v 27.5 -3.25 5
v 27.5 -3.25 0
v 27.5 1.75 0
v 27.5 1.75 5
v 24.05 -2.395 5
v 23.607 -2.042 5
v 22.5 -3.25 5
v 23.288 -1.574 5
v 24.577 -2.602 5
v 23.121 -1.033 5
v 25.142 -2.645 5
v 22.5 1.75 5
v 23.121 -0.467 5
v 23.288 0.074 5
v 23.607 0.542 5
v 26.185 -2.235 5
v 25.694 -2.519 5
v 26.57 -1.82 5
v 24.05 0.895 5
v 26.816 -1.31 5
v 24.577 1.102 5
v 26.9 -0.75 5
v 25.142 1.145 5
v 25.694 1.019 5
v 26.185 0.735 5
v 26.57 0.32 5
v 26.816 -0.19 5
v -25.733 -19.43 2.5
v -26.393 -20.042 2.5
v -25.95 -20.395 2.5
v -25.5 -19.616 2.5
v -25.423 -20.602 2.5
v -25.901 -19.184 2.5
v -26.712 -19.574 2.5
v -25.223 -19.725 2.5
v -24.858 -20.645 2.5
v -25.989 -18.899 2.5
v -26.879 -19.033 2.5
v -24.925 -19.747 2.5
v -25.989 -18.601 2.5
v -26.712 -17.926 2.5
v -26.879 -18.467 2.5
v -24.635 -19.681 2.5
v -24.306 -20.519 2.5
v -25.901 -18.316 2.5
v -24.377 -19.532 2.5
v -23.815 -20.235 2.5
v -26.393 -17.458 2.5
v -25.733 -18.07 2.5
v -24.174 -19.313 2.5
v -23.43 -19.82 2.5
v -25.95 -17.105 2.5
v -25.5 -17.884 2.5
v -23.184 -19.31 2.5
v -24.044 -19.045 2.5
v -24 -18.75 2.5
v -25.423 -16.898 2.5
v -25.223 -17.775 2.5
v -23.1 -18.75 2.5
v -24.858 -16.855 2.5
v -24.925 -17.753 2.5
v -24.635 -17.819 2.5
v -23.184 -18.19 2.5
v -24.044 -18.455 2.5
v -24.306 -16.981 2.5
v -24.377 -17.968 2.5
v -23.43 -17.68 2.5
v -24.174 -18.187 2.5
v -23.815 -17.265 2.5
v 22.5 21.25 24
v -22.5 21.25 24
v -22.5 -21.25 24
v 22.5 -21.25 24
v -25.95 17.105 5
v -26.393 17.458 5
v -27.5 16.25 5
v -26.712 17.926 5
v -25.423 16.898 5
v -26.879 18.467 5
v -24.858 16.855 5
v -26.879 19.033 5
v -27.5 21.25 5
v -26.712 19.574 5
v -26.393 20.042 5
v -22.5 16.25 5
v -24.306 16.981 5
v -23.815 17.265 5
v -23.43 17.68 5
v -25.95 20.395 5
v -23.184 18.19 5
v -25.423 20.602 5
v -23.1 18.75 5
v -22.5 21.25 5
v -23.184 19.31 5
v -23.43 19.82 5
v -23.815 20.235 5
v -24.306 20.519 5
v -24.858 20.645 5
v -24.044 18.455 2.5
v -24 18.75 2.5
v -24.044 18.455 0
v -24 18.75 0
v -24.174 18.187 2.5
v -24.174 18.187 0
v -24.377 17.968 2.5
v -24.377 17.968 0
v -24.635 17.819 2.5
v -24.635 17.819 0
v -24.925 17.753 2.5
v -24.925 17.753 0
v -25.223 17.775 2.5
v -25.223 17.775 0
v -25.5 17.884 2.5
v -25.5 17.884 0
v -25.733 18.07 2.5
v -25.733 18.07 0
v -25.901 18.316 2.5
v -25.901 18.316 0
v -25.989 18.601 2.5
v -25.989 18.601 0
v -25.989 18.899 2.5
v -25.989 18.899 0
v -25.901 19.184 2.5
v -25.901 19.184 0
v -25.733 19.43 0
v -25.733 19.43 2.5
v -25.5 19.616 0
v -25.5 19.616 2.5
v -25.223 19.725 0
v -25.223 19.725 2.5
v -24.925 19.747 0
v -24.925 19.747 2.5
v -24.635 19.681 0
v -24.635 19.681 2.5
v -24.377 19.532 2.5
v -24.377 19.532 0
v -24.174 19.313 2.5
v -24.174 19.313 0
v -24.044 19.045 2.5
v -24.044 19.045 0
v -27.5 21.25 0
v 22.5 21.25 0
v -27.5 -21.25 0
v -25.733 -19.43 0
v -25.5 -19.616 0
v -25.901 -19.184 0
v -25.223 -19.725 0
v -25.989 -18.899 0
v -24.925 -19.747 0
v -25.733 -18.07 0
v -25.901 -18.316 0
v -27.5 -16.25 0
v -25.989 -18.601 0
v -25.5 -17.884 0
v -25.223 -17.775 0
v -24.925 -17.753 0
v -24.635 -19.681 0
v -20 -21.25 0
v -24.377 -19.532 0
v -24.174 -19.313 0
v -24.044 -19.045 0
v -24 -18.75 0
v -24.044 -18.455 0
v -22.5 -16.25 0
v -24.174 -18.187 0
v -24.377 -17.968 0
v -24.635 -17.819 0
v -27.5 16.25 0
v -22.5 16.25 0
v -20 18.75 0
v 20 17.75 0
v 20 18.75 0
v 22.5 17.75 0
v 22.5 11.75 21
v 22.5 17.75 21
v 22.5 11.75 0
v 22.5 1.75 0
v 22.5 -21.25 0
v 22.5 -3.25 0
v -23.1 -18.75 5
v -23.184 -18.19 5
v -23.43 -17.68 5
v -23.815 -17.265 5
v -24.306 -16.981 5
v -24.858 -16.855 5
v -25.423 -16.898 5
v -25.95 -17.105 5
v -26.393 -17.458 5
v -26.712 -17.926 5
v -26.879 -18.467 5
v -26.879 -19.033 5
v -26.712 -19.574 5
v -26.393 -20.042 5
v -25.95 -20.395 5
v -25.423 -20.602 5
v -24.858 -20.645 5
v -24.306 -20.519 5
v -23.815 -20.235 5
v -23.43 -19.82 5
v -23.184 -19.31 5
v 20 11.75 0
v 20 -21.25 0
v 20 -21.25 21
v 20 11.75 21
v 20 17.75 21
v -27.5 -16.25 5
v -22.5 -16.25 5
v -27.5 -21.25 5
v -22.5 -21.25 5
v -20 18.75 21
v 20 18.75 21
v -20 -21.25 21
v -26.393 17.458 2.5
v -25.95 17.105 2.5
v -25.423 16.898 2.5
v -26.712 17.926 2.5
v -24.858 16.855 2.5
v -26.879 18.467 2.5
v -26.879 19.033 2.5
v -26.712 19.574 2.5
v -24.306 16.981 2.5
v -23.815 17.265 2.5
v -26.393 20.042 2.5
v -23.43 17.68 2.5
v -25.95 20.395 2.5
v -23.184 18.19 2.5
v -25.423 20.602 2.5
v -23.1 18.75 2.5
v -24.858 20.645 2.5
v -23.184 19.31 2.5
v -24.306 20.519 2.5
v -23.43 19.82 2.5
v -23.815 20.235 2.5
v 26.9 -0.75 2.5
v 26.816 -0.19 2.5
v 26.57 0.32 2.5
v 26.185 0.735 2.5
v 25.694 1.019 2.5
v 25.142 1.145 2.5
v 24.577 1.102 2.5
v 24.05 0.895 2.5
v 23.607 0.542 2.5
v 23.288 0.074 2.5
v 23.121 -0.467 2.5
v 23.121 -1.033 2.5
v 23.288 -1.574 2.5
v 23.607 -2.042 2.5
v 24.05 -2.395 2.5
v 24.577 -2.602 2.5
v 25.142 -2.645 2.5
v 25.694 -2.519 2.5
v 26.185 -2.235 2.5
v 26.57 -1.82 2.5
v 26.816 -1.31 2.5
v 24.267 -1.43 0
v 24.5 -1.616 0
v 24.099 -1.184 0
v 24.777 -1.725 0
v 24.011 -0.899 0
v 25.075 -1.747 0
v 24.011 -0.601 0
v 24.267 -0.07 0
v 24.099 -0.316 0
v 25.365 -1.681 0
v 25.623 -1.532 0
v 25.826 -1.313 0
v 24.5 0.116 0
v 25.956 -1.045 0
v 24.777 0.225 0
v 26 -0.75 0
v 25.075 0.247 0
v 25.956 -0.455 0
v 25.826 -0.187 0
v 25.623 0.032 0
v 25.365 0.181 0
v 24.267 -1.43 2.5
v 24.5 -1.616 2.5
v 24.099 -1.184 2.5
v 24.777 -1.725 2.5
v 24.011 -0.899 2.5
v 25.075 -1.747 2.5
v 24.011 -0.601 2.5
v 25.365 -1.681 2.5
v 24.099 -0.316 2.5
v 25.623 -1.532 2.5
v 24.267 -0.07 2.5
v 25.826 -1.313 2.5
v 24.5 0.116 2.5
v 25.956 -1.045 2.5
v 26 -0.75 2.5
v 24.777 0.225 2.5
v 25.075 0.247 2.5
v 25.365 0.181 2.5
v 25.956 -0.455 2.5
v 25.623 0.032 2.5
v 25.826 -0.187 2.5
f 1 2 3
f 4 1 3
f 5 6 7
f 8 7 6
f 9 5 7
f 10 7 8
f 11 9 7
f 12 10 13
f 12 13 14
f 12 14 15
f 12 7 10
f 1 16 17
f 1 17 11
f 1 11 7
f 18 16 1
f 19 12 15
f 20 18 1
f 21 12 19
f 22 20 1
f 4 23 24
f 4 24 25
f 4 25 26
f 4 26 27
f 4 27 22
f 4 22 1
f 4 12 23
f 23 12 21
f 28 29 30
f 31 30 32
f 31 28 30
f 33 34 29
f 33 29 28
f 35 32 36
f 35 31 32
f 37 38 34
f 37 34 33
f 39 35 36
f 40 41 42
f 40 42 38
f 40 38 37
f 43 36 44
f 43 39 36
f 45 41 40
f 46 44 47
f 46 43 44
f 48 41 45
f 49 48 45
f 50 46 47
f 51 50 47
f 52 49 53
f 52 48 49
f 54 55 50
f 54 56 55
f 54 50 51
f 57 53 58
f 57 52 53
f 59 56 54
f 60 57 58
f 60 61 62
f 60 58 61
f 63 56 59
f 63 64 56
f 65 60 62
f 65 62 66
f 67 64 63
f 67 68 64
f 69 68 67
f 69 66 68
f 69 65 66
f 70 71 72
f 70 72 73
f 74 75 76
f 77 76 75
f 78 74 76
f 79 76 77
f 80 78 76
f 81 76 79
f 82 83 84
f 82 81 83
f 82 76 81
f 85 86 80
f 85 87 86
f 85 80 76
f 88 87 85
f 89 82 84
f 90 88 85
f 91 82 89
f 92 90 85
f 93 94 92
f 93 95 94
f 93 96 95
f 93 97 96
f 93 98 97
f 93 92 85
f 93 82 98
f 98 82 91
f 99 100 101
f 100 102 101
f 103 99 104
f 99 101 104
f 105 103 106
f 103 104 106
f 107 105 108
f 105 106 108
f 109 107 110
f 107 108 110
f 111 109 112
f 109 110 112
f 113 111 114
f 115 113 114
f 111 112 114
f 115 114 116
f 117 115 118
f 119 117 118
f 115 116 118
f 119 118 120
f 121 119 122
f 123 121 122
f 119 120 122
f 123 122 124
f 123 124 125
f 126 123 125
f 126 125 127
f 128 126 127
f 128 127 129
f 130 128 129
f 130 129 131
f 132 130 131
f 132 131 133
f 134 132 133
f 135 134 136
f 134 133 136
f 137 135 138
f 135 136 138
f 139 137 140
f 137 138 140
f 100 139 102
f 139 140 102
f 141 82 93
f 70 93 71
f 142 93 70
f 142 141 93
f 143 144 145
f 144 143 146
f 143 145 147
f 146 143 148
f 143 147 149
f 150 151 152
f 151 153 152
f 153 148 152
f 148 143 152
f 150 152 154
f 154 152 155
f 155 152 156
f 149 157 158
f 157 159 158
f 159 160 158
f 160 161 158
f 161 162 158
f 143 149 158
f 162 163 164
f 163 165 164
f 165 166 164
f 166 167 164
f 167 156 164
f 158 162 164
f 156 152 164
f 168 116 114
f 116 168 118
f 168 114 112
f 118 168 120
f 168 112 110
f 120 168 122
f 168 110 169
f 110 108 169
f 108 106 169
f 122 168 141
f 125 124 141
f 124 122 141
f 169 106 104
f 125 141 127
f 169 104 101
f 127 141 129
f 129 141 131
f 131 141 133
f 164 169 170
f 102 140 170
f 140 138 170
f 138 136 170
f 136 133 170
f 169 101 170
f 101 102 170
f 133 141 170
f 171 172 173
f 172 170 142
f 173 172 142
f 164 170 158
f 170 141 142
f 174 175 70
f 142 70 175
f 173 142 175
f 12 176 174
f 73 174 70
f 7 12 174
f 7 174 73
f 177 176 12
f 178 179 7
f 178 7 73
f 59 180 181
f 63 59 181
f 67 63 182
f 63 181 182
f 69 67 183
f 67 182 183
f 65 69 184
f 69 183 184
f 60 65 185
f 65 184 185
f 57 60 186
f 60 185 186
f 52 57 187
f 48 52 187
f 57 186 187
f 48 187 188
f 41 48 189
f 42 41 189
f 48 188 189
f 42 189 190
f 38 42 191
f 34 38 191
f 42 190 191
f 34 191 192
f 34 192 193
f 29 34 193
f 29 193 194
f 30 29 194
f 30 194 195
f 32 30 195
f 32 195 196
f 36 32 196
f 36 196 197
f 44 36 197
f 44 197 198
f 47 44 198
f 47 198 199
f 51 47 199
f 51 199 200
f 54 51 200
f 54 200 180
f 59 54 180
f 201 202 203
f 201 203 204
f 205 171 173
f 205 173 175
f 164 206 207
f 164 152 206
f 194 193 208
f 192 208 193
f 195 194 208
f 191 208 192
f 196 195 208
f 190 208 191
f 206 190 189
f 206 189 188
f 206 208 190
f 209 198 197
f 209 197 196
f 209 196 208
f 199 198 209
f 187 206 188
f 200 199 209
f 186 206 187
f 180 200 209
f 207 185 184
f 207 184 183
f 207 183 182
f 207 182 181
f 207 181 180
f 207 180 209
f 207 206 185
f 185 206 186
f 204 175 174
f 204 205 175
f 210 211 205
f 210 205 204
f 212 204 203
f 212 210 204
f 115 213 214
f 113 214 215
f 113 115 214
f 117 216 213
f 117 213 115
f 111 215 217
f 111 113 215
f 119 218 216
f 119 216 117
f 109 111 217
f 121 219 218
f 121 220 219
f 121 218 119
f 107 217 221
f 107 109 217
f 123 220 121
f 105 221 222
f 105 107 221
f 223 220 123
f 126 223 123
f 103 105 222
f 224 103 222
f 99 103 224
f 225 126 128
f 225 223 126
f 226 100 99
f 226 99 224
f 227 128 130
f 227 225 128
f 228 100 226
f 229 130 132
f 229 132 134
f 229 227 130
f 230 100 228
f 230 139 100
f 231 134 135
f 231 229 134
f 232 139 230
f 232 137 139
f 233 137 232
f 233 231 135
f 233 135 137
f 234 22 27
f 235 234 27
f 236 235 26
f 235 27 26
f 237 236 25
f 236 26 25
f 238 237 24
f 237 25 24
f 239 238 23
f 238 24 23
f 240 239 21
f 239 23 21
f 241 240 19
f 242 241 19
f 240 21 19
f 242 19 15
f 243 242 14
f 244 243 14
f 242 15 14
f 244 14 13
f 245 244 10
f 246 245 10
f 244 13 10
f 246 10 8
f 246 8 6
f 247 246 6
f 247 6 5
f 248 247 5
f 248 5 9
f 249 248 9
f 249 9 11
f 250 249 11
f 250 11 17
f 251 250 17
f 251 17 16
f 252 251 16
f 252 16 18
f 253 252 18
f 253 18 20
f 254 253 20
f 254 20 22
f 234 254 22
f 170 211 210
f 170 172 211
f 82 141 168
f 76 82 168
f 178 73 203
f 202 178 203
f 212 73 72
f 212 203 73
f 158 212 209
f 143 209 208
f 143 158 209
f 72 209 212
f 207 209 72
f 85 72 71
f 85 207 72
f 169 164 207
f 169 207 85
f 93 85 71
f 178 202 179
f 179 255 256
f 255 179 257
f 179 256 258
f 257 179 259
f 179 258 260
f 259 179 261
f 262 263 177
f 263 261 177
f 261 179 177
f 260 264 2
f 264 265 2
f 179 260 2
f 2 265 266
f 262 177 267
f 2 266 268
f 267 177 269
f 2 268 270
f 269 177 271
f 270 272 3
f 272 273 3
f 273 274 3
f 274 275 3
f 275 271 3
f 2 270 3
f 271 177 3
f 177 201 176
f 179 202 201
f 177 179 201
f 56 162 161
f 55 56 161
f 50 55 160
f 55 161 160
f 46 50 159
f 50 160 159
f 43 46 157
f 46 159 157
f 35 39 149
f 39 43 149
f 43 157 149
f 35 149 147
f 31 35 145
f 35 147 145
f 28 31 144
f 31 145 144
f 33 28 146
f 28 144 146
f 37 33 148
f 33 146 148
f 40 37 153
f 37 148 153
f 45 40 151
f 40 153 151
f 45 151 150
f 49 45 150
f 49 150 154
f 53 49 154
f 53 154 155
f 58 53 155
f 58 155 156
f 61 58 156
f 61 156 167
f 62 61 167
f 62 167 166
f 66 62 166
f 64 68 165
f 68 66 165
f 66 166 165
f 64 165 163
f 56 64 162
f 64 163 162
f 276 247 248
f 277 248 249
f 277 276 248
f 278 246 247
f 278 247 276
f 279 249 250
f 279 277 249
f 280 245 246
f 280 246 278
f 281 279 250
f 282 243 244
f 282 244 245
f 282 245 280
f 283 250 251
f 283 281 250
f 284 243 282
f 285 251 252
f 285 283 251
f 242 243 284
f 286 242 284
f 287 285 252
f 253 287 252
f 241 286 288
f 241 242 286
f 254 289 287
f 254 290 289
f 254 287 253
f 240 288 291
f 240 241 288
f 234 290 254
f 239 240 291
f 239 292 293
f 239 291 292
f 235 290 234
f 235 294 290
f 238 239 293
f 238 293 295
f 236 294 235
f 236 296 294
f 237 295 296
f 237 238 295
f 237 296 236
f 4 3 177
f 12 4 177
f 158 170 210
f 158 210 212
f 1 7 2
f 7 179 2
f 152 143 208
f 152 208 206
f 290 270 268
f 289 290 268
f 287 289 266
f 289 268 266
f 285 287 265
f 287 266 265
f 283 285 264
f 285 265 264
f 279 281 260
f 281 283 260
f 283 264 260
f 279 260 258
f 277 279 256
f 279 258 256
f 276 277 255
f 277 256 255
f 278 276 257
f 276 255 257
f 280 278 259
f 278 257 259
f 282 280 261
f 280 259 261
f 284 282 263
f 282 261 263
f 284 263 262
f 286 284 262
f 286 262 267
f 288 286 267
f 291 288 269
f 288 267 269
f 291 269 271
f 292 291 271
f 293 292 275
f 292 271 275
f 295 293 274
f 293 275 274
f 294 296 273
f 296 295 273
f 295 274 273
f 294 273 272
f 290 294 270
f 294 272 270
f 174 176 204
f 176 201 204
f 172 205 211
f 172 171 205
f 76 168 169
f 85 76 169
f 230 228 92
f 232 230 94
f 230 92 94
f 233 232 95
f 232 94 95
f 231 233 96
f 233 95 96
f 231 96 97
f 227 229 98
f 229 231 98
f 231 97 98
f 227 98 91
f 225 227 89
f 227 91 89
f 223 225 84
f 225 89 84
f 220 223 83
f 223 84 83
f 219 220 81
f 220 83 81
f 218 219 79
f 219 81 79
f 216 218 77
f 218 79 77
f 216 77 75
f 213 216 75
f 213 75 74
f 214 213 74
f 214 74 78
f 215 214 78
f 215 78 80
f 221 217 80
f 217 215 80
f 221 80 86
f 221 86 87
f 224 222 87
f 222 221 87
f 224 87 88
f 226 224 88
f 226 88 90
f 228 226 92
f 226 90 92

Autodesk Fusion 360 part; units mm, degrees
sketch "Esquisse1" plane through (0, 0, 0) normal (0, 0, 1) x (1, 0, 0)
  line L0 (-22.5, 21.25) -> (22.5, 21.25)
  line L1 (22.5, 21.25) -> (22.5, -21.25)
  line L2 (22.5, -21.25) -> (-22.5, -21.25)
  line L3 (-22.5, -21.25) -> (-22.5, 21.25)
  line L4 (-22.5, 21.25) -> (22.5, -21.25) construction
  line L5 (22.5, 21.25) -> (-22.5, -21.25) construction
  line L6 (-22.5, 11.75) -> (-22.5, 21.25)
  line L7 (-22.5, -21.25) -> (-27.5, -21.25)
  line L8 (-27.5, -21.25) -> (-27.5, -16.25)
  line L9 (-27.5, -16.25) -> (-22.5, -16.25)
  line L10 (-22.5, -16.25) -> (-22.5, -21.25)
  line L11 (22.5, 21.25) -> (27.5, 21.25)
  line L12 (27.5, 21.25) -> (27.5, 16.25)
  line L13 (27.5, 16.25) -> (22.5, 16.25)
  line L14 (22.5, 16.25) -> (22.5, 21.25)
  line L15 (22.5, -21.25) -> (27.5, -21.25)
  line L16 (27.5, -21.25) -> (27.5, -16.25)
  line L17 (27.5, -16.25) -> (22.5, -16.25)
  line L18 (22.5, -16.25) -> (22.5, -21.25)
  line L19 (-20, -21.25) -> (20, -21.25)
  line L20 (20, -21.25) -> (20, 18.75)
  line L21 (20, 18.75) -> (-20, 18.75)
  line L22 (-20, 18.75) -> (-20, -21.25)
  line L23 (22.5, 21.25) -> (27.5, 16.25)
  line L24 (22.5, -16.25) -> (27.5, -21.25)
  line L25 (-27.5, -16.25) -> (-22.5, -21.25)
  circle A0 centre (25, 18.75) radius 1.9
  circle A1 centre (25, 18.75) radius 1
  circle A2 centre (25, -18.75) radius 1.9
  circle A3 centre (25, -18.75) radius 1
  circle A4 centre (-25, -18.75) radius 1.9
  circle A5 centre (-25, -18.75) radius 1
  line L26 (27.5, 21.25) -> (27.5, 16.25)
  circle A6 centre (25, 18.75) radius 1
  line L27 (-22.5, 21.25) -> (-27.5, 21.25)
  line L28 (-27.5, 21.25) -> (-27.5, 16.25)
  line L29 (-27.5, 16.25) -> (-22.5, 16.25)
  line L30 (-22.5, 16.25) -> (-22.5, 21.25)
  circle A7 centre (-25, 18.75) radius 1.9
  circle A8 centre (-25, 18.75) radius 1
  line L31 (-22.5, 16.25) -> (-27.5, 21.25)
  line L32 (27.5, 1.75) -> (22.5, 1.75)
  line L33 (22.5, 1.75) -> (27.5, -3.25)
  circle A9 centre (25, -0.75) radius 1
  circle A10 centre (25, -0.75) radius 1.9
  line L34 (27.5, -3.25) -> (27.5, 1.75)
  line L35 (22.5, -3.25) -> (27.5, -3.25)
  point P0 (25, 18.75)
  point P1 (-25, 18.75)
  dimension "d1" = 45
  dimension "d2" = 42.5
  dimension "d5" = 5
  dimension "d6" = 5
  dimension "d7" = 5
  dimension "d8" = 5
  dimension "d9" = 5
  dimension "d10" = 5
  dimension "d12" = 2.5
  dimension "d13" = 2.5
  dimension "d14" = 2.5
  dimension "d22" = 3.8
  dimension "d23" = 2
  dimension "d26" = 3.8
  dimension "d27" = 2
  dimension "d28" = 3.8
  dimension "d29" = 2
  dimension "d46" = 5
  dimension "d47" = 2
  dimension "d48" = 5
  dimension "d49" = 5
  dimension "d50" = 2
  dimension "d51" = 3.8
  dimension "d52" = 5
  dimension "d53" = 5
  dimension "d54" = 3.8
  dimension "d55" = 2
  dimension "d56" = 13
extrude "Extrusion1" add sketch "Esquisse1" along normal blind 24 contours L0 L1 L2 L3 L6 L10 L14 L18 L20 L21 L22 L30
extrude "Extrusion2" add sketch "Esquisse1" along normal blind 3 from surface at 21 contours L2 L19 L20 L21 L22
extrude "Extrusion3" add sketch "Esquisse1" along normal blind 5 contours L3 L6 L27 L30 A7 L31 | L28 L29 A7 L31 | A7 A8 L31 | A7 A8 L31 | L1 L33 A10 L35 | L32 L33 A10 L34 | L3 L9 L10 L25 A4 | A8 L31 | A8 L31 | L33 A9 A10 | L33 A9 A10 | L7 L8 L25 A4 | L33 A9 | L33 A9 | L25 A4 A5 | L25 A4 A5 | L25 A5 | L25 A5
extrude "Extrusion4" cut sketch "Esquisse1" against normal blind 2.5 from surface at 5 contours L23 A0 A1 A6 | L23 A0 A1 A6 | A7 A8 L31 | A7 A8 L31 | L33 A9 A10 | L33 A9 A10 | L25 A4 A5 | L25 A4 A5 | L24 A2 A3 | L24 A2 A3
extrude "Extrusion5" cut sketch "Esquisse1" along normal blind 8 contours A8 L31 | A8 L31 | L33 A9 | L33 A9 | L25 A5 | L25 A5 | L24 A3 | L24 A3
sketch "Esquisse2" plane through (-22.5, 0, 0) normal (-1, 0, 0) x (0, -1, 0)
  line L0 (16.25, 5) -> (21.25, 5)
  line L1 (21.25, 5) -> (21.25, 24)
  line L2 (21.25, 24) -> (-21.25, 24)
  line L3 (-21.25, 24) -> (-21.25, 5)
  line L4 (-16.25, 0) -> (16.25, 0)
  line L5 (16.25, 0) -> (16.25, 5)
  line L6 (-17.75, 0) -> (-17.75, 21)
  line L7 (-11.75, 0) -> (-11.75, 21)
  line L8 (-17.75, 21) -> (-11.75, 21)
  line L9 (-21.25, 5) -> (-16.25, 5)
  line L10 (-16.25, 5) -> (-16.25, 0)
  line L11 (-11.75, 0) -> (-17.75, 0)
  dimension "d35" = 3.5
  dimension "d36" = 6
  dimension "d37" = 21
  dimension "d38" = 21
extrude "Extrusion6" cut sketch "Esquisse2" against normal blind 9 from surface at -40 contours L4 L6 L7 L8 L9 L10 L11 | L6 L9 L10 L11
sketch "Esquisse3" plane through (22.5, 0, 0) normal (1, 0, 0) x (0, 1, 0)
  line L0 (17.75, 0) -> (21.25, 0)
  line L1 (21.25, 0) -> (21.25, 24)
  line L2 (17.75, 0) -> (27.75, 0)
  line L3 (27.75, 0) -> (27.75, 21)
  line L4 (27.75, 21) -> (17.75, 21)
  line L5 (17.75, 21) -> (17.75, 0)
  line L6 (17.75, 21) -> (17.75, 0)
  line L7 (11.75, 0) -> (11.75, 21)
  line L8 (11.75, 21) -> (17.75, 21)
  line L9 (21.25, 24) -> (-21.25, 24)
  line L10 (-21.25, 24) -> (-21.25, 0)
  line L11 (-3.25, 5) -> (1.75, 5)
  line L12 (1.75, 0) -> (11.75, 0)
  line L13 (-21.25, 0) -> (-3.25, 0)
  line L14 (-3.25, 0) -> (-3.25, 5)
  line L15 (1.75, 5) -> (1.75, 0)
  dimension "d41" = 10
  dimension "d42" = 21
